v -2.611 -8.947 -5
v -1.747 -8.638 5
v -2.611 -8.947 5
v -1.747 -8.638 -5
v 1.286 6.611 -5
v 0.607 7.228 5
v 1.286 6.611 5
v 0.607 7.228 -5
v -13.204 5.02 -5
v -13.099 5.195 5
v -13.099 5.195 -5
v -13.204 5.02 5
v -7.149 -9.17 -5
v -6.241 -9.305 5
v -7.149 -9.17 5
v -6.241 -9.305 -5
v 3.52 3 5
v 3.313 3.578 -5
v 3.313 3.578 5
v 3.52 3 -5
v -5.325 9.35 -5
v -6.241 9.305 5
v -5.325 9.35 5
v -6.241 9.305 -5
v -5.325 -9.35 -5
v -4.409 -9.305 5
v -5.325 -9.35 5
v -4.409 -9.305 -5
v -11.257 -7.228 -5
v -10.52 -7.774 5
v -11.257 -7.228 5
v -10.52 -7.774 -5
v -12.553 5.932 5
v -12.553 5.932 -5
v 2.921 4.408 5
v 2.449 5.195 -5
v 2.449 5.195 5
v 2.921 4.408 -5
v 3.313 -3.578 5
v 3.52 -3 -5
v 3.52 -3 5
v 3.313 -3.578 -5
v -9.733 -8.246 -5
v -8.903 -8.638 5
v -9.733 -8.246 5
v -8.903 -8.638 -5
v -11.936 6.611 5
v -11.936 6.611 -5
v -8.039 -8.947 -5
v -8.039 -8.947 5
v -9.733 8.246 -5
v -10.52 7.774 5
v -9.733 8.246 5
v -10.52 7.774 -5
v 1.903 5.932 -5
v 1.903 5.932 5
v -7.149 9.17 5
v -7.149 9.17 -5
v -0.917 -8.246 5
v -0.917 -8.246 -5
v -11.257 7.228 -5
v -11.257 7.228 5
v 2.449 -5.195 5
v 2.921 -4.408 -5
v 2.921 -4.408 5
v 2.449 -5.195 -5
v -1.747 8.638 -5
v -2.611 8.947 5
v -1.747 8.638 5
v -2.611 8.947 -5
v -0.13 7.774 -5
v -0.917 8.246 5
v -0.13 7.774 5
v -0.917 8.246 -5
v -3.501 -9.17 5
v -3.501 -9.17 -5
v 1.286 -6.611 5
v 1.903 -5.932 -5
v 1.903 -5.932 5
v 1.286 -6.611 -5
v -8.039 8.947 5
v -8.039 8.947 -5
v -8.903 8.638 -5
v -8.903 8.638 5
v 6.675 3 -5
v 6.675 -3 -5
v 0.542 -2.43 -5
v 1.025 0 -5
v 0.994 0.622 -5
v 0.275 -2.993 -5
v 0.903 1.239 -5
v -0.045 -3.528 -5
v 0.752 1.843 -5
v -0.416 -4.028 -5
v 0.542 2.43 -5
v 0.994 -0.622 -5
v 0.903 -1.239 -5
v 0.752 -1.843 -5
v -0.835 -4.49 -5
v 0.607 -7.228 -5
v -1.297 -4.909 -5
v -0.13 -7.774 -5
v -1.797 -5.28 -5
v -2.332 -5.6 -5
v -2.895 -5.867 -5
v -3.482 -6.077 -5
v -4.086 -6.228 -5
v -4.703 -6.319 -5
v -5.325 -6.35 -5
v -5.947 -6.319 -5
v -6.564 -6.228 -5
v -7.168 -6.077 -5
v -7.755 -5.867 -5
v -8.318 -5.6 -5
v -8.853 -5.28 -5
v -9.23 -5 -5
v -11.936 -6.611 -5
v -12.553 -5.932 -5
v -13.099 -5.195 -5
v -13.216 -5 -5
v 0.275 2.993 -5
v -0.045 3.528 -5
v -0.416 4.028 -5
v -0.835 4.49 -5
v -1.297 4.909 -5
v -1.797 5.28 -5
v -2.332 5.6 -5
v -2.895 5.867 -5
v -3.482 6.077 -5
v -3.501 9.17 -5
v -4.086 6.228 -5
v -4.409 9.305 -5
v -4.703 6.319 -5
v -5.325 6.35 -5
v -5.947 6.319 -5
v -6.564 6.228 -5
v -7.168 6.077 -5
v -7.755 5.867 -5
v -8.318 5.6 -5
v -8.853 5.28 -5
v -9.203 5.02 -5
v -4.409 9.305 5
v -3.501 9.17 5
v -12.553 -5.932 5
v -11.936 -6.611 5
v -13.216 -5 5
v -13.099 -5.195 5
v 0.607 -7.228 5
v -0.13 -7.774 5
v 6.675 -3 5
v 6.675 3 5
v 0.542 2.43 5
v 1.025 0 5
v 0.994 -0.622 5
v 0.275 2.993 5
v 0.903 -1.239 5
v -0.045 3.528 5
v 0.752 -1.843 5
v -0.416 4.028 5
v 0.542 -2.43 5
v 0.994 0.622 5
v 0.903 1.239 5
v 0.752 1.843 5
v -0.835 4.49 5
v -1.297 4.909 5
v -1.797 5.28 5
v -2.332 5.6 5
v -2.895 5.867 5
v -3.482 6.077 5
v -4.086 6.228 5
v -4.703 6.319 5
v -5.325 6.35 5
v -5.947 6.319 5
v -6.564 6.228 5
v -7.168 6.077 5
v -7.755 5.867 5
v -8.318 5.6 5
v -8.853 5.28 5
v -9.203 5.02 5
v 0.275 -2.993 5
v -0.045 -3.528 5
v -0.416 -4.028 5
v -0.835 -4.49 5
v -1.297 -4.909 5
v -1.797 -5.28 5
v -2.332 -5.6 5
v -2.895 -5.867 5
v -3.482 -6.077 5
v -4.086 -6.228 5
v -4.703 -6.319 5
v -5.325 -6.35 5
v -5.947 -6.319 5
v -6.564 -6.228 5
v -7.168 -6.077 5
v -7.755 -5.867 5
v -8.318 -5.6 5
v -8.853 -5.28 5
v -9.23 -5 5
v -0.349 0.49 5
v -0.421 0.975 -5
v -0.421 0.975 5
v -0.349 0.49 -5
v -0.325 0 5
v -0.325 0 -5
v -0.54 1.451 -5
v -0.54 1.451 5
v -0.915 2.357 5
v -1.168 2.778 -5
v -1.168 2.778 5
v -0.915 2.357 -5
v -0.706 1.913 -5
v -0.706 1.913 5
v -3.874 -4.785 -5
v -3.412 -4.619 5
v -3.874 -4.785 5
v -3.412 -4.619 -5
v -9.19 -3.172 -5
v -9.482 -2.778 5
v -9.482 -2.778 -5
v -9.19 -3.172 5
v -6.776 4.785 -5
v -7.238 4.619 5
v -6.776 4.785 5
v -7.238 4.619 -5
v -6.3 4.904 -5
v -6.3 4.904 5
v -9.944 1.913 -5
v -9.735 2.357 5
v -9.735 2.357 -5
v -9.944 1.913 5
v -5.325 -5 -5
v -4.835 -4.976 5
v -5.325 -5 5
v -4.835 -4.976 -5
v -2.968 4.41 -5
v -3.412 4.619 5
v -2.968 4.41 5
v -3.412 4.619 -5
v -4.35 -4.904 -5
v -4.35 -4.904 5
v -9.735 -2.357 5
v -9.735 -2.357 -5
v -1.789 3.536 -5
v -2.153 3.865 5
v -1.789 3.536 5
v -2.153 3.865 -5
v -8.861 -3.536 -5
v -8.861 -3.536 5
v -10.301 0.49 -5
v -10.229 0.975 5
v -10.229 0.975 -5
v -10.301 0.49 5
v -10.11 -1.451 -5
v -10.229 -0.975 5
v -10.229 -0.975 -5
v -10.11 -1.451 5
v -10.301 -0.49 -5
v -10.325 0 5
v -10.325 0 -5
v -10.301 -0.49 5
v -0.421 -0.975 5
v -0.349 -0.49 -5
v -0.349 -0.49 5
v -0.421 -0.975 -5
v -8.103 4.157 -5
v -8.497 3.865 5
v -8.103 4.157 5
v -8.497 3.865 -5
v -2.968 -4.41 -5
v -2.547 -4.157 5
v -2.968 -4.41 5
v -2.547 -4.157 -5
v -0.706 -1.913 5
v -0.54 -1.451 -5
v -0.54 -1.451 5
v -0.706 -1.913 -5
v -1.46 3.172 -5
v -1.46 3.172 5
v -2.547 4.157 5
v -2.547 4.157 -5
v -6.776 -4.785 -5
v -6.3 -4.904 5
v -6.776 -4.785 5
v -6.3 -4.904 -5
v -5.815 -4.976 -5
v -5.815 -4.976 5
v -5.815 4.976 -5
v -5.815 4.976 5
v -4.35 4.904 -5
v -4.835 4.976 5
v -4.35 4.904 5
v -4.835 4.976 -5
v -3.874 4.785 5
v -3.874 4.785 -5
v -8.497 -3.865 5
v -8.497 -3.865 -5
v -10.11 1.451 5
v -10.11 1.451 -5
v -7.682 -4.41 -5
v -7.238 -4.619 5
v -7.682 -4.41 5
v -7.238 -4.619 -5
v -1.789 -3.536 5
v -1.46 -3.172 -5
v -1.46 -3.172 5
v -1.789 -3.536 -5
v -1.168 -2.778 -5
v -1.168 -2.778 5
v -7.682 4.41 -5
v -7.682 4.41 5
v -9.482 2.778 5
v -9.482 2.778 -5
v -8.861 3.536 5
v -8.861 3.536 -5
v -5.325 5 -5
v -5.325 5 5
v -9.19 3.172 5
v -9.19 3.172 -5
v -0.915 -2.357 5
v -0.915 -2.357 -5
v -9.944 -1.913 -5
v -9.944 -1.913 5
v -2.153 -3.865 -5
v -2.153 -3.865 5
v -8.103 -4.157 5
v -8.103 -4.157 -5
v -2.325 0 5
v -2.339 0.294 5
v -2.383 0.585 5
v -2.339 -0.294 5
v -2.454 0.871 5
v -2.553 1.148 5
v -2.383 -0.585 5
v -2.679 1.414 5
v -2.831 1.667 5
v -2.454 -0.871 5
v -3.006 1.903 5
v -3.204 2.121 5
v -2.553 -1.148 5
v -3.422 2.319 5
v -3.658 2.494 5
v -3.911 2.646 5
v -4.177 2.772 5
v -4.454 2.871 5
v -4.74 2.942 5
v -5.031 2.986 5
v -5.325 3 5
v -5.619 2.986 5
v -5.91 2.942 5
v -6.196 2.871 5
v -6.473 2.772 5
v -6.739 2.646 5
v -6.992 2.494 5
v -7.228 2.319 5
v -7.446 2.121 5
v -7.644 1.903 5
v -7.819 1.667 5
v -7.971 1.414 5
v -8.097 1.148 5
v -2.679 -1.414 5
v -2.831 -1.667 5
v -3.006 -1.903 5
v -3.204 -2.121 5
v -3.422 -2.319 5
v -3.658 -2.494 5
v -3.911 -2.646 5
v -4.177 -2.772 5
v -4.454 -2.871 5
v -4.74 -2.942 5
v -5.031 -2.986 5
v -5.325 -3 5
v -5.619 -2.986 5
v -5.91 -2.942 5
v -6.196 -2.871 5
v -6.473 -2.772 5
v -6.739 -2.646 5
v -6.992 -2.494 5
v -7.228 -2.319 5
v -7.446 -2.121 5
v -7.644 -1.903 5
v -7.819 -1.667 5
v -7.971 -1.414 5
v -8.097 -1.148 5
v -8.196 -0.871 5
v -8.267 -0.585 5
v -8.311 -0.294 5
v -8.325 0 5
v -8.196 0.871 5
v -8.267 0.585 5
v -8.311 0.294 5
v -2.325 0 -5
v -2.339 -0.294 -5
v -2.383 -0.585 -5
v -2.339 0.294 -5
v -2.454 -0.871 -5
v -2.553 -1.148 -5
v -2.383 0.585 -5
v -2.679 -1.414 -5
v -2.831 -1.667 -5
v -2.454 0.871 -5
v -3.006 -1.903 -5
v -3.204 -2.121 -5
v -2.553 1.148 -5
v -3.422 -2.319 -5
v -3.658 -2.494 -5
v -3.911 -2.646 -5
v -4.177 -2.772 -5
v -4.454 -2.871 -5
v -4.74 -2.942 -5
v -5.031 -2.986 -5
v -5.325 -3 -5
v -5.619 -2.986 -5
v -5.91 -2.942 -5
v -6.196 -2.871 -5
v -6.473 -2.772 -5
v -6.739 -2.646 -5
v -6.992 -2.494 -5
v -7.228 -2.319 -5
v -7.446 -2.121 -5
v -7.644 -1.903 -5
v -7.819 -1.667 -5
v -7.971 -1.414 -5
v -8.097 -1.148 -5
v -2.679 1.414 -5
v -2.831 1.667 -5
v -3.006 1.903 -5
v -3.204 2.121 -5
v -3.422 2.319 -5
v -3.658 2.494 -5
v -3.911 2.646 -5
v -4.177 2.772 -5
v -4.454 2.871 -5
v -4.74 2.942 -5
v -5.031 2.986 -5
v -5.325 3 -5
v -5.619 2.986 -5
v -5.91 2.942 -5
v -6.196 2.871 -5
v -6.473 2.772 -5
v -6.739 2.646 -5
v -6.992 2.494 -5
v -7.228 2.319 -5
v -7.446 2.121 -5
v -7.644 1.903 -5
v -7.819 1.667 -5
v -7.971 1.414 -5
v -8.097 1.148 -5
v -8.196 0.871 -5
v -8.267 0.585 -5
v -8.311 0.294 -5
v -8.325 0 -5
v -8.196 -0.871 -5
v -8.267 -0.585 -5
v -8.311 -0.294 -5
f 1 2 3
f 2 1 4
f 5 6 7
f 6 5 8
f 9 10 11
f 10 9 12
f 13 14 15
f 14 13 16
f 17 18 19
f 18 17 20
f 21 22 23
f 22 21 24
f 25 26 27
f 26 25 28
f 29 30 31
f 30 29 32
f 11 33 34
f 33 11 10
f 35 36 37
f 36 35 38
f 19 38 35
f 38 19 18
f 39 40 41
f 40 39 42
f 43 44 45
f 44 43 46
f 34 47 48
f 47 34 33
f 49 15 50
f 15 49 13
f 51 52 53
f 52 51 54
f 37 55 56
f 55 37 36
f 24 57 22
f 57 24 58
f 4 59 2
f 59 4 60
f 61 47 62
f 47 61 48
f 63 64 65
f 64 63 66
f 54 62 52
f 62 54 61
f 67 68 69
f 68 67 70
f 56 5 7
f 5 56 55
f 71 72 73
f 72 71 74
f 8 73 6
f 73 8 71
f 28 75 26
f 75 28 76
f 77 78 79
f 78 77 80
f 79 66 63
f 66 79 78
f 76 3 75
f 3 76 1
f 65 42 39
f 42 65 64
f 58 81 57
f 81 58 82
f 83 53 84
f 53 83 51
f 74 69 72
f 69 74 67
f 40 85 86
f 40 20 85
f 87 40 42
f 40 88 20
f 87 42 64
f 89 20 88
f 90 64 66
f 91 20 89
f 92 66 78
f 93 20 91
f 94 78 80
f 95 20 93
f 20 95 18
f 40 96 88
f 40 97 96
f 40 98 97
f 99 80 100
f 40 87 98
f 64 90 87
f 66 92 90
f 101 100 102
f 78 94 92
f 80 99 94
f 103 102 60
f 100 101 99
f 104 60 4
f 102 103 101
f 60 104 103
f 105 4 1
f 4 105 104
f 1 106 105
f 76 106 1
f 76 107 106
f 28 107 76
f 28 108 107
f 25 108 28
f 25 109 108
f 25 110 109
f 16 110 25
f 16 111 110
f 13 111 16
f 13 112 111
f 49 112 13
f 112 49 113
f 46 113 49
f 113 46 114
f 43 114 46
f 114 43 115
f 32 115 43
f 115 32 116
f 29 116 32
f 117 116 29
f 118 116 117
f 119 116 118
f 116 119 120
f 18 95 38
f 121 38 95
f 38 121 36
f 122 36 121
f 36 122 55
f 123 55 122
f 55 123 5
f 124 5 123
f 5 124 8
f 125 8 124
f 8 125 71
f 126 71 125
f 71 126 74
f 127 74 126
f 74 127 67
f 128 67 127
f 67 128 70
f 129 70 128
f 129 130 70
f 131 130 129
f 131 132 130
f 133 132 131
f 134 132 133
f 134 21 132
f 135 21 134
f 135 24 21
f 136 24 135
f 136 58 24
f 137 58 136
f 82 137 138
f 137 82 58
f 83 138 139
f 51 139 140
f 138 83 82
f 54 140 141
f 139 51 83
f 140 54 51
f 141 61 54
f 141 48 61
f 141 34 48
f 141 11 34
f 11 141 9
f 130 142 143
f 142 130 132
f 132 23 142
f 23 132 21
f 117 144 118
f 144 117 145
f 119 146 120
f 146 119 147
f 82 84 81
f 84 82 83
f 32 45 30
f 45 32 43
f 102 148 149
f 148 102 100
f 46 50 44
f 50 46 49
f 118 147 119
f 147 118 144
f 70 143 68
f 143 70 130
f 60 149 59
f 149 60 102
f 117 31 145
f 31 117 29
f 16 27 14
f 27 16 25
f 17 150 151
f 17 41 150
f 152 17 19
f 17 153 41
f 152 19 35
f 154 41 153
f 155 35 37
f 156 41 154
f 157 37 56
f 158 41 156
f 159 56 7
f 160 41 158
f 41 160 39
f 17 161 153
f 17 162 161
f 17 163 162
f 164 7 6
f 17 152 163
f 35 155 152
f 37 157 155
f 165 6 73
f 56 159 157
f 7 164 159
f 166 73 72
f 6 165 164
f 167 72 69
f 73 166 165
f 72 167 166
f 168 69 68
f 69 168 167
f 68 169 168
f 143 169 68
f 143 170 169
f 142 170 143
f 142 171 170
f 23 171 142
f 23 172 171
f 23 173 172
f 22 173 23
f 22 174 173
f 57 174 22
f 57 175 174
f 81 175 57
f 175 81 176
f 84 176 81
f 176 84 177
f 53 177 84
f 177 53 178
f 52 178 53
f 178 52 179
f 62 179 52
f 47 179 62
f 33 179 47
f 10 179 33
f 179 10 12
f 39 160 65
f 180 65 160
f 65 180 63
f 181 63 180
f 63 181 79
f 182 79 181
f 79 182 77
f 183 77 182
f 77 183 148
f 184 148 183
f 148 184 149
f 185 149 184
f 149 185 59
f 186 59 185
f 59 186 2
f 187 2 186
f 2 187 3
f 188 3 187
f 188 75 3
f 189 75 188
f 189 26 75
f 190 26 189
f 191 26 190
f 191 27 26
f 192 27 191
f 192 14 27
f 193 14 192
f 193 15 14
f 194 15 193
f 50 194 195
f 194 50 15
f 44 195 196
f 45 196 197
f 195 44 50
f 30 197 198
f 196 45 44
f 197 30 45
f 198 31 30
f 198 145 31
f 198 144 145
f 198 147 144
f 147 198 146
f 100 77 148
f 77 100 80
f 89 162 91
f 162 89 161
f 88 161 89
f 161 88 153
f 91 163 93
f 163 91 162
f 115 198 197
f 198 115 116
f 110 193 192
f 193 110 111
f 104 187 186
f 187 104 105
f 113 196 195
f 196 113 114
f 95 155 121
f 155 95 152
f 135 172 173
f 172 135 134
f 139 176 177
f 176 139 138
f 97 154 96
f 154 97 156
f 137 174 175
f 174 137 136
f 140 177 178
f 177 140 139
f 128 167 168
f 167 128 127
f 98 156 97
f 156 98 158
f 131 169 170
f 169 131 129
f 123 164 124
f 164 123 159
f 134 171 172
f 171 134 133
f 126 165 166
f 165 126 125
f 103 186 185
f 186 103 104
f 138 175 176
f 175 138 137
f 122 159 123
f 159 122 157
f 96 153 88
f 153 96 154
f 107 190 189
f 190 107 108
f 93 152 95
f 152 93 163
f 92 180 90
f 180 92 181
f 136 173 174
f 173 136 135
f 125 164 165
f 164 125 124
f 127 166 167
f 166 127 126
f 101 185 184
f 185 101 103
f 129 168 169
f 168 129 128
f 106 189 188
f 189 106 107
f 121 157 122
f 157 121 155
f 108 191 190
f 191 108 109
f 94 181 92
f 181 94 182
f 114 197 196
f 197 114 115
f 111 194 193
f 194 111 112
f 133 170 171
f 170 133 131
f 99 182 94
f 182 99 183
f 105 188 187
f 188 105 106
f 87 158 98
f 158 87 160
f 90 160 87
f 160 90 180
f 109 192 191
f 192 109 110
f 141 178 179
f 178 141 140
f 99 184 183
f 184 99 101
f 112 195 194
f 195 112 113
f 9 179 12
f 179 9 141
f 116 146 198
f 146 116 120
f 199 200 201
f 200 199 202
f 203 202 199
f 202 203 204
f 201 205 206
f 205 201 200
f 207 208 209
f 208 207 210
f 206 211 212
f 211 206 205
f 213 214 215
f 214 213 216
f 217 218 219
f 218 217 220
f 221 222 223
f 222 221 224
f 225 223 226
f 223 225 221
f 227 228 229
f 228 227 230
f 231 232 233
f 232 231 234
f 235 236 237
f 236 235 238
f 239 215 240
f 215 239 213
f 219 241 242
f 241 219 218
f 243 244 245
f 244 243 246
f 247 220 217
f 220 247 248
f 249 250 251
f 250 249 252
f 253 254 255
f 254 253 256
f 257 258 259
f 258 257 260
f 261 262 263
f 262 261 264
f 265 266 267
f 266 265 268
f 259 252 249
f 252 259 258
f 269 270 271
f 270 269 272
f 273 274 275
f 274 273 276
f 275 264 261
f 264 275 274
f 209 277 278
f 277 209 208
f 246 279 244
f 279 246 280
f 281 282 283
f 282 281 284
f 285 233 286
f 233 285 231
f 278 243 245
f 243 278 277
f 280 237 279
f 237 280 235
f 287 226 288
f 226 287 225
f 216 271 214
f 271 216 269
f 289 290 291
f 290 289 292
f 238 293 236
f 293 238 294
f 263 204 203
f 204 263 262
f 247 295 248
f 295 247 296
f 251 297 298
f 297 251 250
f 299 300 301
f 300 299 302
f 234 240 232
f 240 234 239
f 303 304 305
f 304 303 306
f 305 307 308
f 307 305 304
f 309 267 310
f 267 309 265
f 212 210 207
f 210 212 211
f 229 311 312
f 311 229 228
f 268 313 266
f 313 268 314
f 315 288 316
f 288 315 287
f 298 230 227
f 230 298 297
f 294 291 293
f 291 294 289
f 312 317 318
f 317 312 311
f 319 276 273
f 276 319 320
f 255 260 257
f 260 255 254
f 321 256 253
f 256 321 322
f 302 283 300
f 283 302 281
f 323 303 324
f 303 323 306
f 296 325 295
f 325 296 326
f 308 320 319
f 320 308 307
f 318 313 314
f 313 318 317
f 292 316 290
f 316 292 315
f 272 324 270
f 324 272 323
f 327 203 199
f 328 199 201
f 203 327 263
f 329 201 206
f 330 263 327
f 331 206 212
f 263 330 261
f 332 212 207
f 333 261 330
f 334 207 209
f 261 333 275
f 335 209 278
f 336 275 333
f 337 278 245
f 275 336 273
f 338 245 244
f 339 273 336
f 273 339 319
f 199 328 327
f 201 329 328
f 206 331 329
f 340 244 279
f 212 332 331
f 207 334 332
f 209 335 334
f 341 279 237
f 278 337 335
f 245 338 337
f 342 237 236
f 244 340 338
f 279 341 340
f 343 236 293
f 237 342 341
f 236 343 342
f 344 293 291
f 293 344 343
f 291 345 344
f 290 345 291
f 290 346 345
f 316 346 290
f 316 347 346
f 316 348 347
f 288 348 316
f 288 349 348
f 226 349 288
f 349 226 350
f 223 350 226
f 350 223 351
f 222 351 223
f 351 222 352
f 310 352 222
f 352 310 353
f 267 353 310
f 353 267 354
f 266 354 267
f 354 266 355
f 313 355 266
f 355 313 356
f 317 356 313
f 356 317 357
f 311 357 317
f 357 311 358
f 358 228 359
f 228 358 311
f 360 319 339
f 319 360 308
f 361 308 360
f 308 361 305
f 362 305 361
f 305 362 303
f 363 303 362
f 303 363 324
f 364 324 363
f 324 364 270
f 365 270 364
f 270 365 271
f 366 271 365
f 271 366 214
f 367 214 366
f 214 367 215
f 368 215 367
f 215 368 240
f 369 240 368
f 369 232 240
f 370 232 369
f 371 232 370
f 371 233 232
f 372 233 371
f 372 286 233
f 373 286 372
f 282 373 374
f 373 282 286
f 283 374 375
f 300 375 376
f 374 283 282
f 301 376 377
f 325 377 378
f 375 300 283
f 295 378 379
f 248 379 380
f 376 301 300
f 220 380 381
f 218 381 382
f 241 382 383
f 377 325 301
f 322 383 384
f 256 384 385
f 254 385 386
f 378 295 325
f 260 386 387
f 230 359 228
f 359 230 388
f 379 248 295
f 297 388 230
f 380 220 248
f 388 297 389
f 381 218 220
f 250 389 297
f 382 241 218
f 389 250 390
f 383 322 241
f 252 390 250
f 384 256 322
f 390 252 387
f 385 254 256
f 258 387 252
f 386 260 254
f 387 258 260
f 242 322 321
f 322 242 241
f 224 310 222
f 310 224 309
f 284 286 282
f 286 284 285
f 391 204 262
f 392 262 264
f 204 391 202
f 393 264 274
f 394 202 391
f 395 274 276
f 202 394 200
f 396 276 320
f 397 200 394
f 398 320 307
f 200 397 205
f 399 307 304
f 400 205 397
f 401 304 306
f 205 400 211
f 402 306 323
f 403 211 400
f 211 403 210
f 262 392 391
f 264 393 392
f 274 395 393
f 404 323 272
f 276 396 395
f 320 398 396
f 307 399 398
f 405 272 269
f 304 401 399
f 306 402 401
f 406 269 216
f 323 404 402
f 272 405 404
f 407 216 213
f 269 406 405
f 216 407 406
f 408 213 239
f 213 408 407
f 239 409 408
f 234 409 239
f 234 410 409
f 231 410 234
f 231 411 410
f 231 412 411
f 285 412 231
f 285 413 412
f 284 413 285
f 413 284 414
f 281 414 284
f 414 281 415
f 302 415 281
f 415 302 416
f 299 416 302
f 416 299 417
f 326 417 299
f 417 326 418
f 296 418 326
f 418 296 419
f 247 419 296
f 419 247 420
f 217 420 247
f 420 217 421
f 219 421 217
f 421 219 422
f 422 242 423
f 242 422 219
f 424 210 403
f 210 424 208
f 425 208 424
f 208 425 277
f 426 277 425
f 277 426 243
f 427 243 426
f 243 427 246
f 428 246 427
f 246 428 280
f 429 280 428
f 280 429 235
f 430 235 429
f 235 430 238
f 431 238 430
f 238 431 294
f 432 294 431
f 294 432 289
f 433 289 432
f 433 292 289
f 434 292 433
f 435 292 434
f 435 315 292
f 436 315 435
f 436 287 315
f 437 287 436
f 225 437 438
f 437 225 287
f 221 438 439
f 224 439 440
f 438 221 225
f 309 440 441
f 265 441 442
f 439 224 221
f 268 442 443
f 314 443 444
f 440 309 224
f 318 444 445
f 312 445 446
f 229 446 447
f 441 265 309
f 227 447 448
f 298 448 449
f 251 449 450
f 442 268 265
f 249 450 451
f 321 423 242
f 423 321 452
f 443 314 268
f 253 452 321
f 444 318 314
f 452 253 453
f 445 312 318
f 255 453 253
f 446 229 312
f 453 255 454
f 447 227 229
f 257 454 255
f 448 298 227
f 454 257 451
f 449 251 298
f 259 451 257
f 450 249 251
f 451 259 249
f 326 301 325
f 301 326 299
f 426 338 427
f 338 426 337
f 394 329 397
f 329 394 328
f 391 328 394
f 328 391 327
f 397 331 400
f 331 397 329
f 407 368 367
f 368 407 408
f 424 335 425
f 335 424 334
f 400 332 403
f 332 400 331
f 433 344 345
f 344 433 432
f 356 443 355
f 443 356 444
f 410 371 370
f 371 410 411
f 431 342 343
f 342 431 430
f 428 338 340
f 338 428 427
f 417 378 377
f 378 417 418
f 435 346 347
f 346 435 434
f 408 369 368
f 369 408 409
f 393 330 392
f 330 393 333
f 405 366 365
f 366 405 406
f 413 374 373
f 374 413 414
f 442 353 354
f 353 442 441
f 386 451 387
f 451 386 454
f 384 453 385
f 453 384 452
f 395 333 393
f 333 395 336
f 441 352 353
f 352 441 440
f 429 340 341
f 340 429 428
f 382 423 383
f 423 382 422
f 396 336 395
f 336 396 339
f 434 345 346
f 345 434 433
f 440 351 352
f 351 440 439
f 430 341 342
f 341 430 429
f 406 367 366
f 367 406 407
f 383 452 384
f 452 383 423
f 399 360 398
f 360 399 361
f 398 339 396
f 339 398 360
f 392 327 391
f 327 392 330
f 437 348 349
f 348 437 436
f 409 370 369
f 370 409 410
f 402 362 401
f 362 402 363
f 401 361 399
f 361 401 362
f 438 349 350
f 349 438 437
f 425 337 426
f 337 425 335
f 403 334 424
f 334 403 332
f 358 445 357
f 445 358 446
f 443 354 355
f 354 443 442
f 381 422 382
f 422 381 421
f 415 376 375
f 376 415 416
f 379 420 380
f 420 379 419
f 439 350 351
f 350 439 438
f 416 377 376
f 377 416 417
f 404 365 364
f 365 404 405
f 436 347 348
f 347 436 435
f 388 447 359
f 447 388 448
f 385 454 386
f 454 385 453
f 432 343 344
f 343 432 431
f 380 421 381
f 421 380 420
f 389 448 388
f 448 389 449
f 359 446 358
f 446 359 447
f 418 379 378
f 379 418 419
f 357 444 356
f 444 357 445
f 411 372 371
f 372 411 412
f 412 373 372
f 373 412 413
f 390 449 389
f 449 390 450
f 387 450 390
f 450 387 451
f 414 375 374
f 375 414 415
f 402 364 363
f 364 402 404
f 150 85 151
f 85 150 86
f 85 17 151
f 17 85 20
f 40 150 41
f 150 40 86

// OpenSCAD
// ---------- Parameters ----------
rod_inner_d = 12.7;          // inner diameter of the rod ring (mm)
rod_wall = 3;                // wall thickness of the rod ring (mm)
rod_outer_d = rod_inner_d + 2*rod_wall; // outer diameter of the rod ring (mm)

tubing_inner_d = 6;          // inner diameter of the tubing ring (mm)
tubing_wall = 2;             // wall thickness of the tubing ring (mm)
tubing_outer_d = tubing_inner_d + 2*tubing_wall; // outer diameter of the tubing ring (mm)

rod_center = [0,0];          // centre of the rod ring (mm)
tubing_center = [15,0];      // centre of the tubing ring (mm)

bridge_x_start = 8;          // left x‑edge of the bridge (mm)
bridge_x_end   = 12;         // right x‑edge of the bridge (mm)
bridge_width_y = 6;          // total width in Y direction (mm)

height = 10;                 // extrusion height (mm)

$fn = 64;                    // resolution for circles/cylinders

// ---------- Helper: translation to centre whole part ----------
min_x = -rod_outer_d/2;                     // leftmost point of the whole part
max_x = tubing_center[0] + tubing_outer_d/2; // rightmost point of the whole part
center_shift_x = -( (max_x + min_x)/2 );    // shift needed to centre on origin

// ---------- Modules ----------
module rod_ring() {
    // Ring (outer cylinder minus inner cylinder)
    difference(){
        // outer cylinder
        cylinder(r=rod_outer_d/2, h=height, center=true);
        // inner cylinder (cut a little extra in Z)
        cylinder(r=rod_inner_d/2, h=height+0.02, center=true);
        // opening on the -X side (x < 0, -5 < y < 5)
        translate([-200, -5, -height/2-0.01])
            cube([200, 10.02, height+0.02]); // extends far beyond the ring
    }
    translate(rod_center) {} // centre is already at origin
}

module tubing_ring() {
    // Ring (outer cylinder minus inner cylinder)
    difference(){
        // outer cylinder
        cylinder(r=tubing_outer_d/2, h=height, center=true);
        // inner cylinder (cut a little extra in Z)
        cylinder(r=tubing_inner_d/2, h=height+0.02, center=true);
        // opening on the +X side (x > 15, -2.25 < y < 2.25)
        translate([tubing_center[0], -2.25, -height/2-0.01])
            cube([200, 4.52, height+0.02]); // extends far beyond the ring
    }
    translate(tubing_center) {} // already placed
}

module bridge() {
    // Solid bridge 6 mm wide (Y) between x = 8 and x = 12
    translate([ (bridge_x_start+bridge_x_end)/2, 0, 0])
        cube([bridge_x_end-bridge_x_start, bridge_width_y, height], center=true);
}

// ---------- Assembly ----------
translate([center_shift_x, 0, 0])  // centre whole part on the origin
union() {
    rod_ring();
    tubing_ring();
    bridge();
}
